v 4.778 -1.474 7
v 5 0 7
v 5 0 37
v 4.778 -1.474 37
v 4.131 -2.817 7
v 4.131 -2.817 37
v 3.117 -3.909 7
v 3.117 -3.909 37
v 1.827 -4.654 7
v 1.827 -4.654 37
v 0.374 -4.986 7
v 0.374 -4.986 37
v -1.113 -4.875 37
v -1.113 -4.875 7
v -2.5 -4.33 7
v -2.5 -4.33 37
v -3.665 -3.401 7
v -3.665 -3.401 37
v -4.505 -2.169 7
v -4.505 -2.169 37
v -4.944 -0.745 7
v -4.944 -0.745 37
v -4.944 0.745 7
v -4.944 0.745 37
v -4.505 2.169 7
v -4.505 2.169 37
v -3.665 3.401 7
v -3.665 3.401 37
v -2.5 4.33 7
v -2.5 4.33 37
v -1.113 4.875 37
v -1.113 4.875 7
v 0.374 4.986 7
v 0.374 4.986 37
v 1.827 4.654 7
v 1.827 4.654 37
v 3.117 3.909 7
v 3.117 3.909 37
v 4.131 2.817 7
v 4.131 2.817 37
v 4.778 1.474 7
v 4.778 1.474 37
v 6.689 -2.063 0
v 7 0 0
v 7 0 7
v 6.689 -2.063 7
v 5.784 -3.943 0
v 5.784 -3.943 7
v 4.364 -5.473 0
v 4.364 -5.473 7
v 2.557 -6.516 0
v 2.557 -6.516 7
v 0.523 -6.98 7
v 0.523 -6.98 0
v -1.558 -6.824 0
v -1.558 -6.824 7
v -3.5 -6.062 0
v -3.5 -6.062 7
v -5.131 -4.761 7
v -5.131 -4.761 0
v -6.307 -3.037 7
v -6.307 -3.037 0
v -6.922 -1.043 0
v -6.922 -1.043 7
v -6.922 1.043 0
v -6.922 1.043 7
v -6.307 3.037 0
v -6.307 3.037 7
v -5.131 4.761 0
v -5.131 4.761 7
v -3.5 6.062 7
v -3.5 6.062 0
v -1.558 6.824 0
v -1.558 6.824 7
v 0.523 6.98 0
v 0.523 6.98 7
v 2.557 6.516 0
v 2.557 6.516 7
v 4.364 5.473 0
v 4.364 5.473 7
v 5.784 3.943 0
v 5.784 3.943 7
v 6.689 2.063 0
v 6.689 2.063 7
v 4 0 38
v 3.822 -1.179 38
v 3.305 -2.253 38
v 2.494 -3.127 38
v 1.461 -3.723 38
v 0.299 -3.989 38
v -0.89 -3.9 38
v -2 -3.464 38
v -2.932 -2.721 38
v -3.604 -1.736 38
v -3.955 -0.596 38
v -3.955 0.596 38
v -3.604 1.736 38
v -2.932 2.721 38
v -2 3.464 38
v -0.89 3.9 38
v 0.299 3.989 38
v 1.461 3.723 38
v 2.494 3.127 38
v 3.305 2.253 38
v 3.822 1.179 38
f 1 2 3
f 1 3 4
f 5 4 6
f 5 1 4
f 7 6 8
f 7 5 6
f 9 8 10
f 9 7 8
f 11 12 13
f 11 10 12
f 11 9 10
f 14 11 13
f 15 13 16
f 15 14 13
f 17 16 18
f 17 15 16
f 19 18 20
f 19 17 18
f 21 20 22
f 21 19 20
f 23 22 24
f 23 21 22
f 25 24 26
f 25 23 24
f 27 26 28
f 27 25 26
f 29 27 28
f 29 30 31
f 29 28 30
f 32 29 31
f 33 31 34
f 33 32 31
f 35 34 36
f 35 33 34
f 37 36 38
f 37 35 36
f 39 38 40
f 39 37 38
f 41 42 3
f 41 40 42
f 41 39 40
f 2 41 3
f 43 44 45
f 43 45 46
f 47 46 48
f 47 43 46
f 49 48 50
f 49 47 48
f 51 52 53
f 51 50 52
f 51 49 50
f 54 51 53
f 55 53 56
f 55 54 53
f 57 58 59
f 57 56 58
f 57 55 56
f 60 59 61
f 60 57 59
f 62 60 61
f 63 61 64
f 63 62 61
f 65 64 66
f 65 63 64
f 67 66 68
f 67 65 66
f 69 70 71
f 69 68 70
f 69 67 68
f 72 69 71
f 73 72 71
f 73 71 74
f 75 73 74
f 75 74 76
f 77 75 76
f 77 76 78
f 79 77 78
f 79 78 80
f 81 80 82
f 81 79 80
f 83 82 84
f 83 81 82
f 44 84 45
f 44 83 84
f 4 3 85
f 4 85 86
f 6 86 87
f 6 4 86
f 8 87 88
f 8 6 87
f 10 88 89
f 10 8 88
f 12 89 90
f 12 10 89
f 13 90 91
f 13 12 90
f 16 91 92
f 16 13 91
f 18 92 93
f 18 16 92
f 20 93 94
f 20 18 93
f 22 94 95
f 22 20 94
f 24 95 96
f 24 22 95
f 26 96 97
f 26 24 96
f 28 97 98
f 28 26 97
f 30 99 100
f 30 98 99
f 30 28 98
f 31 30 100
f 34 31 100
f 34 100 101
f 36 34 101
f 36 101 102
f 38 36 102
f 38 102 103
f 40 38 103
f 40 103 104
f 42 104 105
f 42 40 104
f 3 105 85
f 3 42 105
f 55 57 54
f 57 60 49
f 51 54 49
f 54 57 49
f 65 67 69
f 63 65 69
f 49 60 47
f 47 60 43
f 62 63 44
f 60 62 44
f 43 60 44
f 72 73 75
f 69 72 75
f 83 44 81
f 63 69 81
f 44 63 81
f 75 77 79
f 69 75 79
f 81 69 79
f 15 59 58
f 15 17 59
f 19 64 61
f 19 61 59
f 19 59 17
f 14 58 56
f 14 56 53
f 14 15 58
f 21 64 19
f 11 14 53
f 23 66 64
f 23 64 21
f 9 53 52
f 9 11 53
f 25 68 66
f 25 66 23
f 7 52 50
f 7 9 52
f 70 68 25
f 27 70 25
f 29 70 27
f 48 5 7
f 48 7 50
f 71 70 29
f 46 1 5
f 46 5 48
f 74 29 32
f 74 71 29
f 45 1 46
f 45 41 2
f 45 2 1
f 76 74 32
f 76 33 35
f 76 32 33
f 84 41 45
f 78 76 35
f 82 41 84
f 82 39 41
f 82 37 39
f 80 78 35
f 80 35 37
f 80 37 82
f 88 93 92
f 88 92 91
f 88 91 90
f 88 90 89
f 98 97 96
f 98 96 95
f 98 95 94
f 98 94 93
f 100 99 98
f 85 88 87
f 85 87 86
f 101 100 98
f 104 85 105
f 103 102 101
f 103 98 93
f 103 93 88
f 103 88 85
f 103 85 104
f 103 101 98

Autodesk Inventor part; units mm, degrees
ref_plane "YZ Plane" through (0, 0, 0) normal (1, 0, 0) x (0, 1, 0)
ref_plane "XZ Plane" through (0, 0, 0) normal (0, 1, 0) x (-1, 0, 0)
ref_plane "XY Plane" through (0, 0, 0) normal (0, 0, 1) x (1, 0, 0)
sketch "Sketch1" plane through (0, 0, 0) normal (0, 0, 1) x (1, 0, 0)
  circle A0 centre (0, 0) radius 7
  dimension "d0" = 14
extrude "Extrusion1" add sketch "Sketch1" along normal blind 7
sketch "Sketch2" plane through (0, 0, 7) normal (0, 0, 1) x (1, 0, 0)
  circle A0 centre (0, 0) radius 5
  dimension "d3" = 10
extrude "Extrusion2" add sketch "Sketch2" along normal blind 31
chamfer "Chamfer1" distance 1 angle 45 1 edges at (-5, 0, 38)
properties part number "bolt"
